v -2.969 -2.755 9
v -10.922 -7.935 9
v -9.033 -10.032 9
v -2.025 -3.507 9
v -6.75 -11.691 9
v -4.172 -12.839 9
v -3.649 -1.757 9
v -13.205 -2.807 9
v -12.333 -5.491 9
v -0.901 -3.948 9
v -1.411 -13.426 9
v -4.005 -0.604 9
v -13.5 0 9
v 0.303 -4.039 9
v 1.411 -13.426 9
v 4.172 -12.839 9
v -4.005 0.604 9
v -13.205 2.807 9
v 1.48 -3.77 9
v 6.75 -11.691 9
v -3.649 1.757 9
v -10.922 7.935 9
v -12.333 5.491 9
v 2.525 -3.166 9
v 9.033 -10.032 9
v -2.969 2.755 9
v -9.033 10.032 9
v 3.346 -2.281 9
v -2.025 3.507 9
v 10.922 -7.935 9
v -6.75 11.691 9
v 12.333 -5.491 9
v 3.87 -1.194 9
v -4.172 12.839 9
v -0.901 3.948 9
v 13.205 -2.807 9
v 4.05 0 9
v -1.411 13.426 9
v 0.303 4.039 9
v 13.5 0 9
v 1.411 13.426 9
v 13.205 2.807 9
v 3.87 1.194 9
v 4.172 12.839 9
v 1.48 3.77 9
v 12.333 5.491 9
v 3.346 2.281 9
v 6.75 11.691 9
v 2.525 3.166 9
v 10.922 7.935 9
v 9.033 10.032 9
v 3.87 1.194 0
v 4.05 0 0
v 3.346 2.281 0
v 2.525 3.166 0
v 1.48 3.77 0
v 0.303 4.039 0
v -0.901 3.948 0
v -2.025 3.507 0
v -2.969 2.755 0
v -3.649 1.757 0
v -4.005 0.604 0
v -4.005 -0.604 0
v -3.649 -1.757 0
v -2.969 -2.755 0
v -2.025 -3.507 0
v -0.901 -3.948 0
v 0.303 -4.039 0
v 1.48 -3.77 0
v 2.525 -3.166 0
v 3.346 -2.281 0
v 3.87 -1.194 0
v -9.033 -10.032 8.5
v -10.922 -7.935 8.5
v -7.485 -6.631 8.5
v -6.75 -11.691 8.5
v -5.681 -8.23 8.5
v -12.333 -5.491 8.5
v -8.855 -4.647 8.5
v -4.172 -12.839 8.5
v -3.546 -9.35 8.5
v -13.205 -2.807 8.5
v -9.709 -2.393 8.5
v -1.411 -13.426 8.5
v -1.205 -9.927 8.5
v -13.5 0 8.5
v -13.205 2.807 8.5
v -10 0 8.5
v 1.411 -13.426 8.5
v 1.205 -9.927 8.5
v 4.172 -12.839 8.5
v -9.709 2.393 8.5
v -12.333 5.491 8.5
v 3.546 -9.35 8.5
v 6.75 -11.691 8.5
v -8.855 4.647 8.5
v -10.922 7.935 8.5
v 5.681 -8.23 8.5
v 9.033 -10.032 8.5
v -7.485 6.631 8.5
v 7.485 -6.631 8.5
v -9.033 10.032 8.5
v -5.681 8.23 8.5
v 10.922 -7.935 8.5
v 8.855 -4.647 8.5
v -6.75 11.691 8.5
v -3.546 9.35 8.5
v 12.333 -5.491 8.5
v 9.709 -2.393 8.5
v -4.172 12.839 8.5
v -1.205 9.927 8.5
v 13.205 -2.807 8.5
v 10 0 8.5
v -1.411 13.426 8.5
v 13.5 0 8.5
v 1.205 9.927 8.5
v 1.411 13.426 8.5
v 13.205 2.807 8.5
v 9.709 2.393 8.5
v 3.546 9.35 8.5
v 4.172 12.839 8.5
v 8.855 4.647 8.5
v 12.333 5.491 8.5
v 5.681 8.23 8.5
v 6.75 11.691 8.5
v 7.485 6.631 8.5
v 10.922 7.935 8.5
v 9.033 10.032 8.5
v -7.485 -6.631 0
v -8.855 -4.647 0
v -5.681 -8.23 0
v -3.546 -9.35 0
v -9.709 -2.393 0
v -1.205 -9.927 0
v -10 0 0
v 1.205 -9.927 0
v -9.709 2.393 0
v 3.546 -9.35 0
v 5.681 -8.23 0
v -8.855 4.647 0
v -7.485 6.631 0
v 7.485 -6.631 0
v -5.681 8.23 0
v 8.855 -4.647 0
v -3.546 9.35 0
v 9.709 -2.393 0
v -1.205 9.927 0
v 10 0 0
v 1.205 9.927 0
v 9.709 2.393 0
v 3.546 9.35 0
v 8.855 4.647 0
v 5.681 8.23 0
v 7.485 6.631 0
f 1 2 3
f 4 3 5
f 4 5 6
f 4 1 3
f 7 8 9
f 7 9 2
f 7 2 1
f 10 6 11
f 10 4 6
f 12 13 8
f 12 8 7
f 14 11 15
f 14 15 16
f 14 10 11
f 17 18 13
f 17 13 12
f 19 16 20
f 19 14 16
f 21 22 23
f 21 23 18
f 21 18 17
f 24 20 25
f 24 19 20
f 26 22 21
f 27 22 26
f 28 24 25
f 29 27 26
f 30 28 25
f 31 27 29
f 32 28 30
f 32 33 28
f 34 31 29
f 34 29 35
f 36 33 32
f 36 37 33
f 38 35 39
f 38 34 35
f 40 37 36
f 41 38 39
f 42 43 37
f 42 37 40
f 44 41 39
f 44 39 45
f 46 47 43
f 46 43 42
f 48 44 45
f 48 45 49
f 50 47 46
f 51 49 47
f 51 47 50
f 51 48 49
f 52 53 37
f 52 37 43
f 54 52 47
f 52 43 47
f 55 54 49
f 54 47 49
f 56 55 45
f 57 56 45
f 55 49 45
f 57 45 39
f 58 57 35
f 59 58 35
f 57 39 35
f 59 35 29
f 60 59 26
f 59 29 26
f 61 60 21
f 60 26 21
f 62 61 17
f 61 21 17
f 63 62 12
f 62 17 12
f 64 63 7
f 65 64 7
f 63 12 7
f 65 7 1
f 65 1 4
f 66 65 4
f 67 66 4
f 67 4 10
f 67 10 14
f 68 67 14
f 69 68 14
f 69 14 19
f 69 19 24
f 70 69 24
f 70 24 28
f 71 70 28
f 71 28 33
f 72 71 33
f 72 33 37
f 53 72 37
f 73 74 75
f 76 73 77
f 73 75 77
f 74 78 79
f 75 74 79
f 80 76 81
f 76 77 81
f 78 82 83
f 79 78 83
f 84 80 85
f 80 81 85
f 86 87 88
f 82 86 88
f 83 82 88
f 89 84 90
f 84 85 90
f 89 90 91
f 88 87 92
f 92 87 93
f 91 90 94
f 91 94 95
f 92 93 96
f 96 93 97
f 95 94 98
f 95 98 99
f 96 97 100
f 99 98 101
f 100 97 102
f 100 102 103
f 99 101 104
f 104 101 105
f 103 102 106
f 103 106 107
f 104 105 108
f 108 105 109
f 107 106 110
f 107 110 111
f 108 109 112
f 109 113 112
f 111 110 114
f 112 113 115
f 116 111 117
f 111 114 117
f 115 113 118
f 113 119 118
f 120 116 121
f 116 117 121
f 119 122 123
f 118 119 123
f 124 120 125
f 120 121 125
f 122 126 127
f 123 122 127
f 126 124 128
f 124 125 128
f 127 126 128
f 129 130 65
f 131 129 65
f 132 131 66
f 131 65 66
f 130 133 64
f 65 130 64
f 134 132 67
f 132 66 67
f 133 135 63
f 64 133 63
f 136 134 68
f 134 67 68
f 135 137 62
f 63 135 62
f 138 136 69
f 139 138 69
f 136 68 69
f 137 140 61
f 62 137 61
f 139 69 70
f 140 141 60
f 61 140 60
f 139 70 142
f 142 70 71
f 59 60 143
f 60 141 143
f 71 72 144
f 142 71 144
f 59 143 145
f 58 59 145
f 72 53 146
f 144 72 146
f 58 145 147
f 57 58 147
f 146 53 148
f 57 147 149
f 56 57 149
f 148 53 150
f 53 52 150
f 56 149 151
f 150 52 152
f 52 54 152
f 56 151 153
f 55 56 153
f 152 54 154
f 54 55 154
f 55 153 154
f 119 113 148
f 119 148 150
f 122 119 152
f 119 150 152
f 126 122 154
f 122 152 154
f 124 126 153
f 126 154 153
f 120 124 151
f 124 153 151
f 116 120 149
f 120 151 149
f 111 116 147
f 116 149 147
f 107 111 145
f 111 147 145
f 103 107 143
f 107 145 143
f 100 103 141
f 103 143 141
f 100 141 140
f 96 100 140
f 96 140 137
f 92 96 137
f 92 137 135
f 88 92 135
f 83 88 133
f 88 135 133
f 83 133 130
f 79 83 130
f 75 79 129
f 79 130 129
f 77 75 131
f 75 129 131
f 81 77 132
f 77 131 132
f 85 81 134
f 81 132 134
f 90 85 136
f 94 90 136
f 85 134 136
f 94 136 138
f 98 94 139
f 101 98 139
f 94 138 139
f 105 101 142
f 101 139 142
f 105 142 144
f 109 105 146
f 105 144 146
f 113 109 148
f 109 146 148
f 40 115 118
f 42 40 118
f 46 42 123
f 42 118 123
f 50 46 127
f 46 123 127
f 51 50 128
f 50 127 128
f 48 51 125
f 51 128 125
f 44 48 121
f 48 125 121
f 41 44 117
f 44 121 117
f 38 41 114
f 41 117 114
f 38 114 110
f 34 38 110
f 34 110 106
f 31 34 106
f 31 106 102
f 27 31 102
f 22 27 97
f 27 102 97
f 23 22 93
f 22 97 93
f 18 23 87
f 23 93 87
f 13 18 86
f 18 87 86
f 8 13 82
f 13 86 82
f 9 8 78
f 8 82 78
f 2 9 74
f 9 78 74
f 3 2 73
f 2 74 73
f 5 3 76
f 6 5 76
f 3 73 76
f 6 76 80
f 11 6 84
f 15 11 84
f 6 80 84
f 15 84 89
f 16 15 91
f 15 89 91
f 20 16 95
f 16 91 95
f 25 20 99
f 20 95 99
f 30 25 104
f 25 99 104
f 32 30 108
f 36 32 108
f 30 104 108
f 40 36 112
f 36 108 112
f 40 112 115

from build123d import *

# Parameters (mm, degrees)
F0_R     = 10
F1_DEPTH = 8.5
F2_R     = 10
F2_R_2   = 13.5
F3_DEPTH = 0.5
F4_R     = 4.05
F5_DEPTH = 9.001


with BuildPart() as f1:
    # F0 (on Top) → F1 (new body)
    with BuildSketch(Plane.XY):
        Circle(F0_R)
    extrude(amount=F1_DEPTH)

    # F2 (on face) → F3 (join)
    with BuildSketch(Plane.XY.offset(8.5)):
        Circle(F2_R)
        Circle(F2_R_2)
        Circle(F2_R, mode=Mode.SUBTRACT)
        Circle(F2_R_2)
    extrude(amount=F3_DEPTH)

    # F4 (on face) → F5 (cut, through all)
    with BuildSketch(Plane.XY.offset(9)):
        Circle(F4_R)
    extrude(amount=-F5_DEPTH, mode=Mode.SUBTRACT)


solid = f1.part
